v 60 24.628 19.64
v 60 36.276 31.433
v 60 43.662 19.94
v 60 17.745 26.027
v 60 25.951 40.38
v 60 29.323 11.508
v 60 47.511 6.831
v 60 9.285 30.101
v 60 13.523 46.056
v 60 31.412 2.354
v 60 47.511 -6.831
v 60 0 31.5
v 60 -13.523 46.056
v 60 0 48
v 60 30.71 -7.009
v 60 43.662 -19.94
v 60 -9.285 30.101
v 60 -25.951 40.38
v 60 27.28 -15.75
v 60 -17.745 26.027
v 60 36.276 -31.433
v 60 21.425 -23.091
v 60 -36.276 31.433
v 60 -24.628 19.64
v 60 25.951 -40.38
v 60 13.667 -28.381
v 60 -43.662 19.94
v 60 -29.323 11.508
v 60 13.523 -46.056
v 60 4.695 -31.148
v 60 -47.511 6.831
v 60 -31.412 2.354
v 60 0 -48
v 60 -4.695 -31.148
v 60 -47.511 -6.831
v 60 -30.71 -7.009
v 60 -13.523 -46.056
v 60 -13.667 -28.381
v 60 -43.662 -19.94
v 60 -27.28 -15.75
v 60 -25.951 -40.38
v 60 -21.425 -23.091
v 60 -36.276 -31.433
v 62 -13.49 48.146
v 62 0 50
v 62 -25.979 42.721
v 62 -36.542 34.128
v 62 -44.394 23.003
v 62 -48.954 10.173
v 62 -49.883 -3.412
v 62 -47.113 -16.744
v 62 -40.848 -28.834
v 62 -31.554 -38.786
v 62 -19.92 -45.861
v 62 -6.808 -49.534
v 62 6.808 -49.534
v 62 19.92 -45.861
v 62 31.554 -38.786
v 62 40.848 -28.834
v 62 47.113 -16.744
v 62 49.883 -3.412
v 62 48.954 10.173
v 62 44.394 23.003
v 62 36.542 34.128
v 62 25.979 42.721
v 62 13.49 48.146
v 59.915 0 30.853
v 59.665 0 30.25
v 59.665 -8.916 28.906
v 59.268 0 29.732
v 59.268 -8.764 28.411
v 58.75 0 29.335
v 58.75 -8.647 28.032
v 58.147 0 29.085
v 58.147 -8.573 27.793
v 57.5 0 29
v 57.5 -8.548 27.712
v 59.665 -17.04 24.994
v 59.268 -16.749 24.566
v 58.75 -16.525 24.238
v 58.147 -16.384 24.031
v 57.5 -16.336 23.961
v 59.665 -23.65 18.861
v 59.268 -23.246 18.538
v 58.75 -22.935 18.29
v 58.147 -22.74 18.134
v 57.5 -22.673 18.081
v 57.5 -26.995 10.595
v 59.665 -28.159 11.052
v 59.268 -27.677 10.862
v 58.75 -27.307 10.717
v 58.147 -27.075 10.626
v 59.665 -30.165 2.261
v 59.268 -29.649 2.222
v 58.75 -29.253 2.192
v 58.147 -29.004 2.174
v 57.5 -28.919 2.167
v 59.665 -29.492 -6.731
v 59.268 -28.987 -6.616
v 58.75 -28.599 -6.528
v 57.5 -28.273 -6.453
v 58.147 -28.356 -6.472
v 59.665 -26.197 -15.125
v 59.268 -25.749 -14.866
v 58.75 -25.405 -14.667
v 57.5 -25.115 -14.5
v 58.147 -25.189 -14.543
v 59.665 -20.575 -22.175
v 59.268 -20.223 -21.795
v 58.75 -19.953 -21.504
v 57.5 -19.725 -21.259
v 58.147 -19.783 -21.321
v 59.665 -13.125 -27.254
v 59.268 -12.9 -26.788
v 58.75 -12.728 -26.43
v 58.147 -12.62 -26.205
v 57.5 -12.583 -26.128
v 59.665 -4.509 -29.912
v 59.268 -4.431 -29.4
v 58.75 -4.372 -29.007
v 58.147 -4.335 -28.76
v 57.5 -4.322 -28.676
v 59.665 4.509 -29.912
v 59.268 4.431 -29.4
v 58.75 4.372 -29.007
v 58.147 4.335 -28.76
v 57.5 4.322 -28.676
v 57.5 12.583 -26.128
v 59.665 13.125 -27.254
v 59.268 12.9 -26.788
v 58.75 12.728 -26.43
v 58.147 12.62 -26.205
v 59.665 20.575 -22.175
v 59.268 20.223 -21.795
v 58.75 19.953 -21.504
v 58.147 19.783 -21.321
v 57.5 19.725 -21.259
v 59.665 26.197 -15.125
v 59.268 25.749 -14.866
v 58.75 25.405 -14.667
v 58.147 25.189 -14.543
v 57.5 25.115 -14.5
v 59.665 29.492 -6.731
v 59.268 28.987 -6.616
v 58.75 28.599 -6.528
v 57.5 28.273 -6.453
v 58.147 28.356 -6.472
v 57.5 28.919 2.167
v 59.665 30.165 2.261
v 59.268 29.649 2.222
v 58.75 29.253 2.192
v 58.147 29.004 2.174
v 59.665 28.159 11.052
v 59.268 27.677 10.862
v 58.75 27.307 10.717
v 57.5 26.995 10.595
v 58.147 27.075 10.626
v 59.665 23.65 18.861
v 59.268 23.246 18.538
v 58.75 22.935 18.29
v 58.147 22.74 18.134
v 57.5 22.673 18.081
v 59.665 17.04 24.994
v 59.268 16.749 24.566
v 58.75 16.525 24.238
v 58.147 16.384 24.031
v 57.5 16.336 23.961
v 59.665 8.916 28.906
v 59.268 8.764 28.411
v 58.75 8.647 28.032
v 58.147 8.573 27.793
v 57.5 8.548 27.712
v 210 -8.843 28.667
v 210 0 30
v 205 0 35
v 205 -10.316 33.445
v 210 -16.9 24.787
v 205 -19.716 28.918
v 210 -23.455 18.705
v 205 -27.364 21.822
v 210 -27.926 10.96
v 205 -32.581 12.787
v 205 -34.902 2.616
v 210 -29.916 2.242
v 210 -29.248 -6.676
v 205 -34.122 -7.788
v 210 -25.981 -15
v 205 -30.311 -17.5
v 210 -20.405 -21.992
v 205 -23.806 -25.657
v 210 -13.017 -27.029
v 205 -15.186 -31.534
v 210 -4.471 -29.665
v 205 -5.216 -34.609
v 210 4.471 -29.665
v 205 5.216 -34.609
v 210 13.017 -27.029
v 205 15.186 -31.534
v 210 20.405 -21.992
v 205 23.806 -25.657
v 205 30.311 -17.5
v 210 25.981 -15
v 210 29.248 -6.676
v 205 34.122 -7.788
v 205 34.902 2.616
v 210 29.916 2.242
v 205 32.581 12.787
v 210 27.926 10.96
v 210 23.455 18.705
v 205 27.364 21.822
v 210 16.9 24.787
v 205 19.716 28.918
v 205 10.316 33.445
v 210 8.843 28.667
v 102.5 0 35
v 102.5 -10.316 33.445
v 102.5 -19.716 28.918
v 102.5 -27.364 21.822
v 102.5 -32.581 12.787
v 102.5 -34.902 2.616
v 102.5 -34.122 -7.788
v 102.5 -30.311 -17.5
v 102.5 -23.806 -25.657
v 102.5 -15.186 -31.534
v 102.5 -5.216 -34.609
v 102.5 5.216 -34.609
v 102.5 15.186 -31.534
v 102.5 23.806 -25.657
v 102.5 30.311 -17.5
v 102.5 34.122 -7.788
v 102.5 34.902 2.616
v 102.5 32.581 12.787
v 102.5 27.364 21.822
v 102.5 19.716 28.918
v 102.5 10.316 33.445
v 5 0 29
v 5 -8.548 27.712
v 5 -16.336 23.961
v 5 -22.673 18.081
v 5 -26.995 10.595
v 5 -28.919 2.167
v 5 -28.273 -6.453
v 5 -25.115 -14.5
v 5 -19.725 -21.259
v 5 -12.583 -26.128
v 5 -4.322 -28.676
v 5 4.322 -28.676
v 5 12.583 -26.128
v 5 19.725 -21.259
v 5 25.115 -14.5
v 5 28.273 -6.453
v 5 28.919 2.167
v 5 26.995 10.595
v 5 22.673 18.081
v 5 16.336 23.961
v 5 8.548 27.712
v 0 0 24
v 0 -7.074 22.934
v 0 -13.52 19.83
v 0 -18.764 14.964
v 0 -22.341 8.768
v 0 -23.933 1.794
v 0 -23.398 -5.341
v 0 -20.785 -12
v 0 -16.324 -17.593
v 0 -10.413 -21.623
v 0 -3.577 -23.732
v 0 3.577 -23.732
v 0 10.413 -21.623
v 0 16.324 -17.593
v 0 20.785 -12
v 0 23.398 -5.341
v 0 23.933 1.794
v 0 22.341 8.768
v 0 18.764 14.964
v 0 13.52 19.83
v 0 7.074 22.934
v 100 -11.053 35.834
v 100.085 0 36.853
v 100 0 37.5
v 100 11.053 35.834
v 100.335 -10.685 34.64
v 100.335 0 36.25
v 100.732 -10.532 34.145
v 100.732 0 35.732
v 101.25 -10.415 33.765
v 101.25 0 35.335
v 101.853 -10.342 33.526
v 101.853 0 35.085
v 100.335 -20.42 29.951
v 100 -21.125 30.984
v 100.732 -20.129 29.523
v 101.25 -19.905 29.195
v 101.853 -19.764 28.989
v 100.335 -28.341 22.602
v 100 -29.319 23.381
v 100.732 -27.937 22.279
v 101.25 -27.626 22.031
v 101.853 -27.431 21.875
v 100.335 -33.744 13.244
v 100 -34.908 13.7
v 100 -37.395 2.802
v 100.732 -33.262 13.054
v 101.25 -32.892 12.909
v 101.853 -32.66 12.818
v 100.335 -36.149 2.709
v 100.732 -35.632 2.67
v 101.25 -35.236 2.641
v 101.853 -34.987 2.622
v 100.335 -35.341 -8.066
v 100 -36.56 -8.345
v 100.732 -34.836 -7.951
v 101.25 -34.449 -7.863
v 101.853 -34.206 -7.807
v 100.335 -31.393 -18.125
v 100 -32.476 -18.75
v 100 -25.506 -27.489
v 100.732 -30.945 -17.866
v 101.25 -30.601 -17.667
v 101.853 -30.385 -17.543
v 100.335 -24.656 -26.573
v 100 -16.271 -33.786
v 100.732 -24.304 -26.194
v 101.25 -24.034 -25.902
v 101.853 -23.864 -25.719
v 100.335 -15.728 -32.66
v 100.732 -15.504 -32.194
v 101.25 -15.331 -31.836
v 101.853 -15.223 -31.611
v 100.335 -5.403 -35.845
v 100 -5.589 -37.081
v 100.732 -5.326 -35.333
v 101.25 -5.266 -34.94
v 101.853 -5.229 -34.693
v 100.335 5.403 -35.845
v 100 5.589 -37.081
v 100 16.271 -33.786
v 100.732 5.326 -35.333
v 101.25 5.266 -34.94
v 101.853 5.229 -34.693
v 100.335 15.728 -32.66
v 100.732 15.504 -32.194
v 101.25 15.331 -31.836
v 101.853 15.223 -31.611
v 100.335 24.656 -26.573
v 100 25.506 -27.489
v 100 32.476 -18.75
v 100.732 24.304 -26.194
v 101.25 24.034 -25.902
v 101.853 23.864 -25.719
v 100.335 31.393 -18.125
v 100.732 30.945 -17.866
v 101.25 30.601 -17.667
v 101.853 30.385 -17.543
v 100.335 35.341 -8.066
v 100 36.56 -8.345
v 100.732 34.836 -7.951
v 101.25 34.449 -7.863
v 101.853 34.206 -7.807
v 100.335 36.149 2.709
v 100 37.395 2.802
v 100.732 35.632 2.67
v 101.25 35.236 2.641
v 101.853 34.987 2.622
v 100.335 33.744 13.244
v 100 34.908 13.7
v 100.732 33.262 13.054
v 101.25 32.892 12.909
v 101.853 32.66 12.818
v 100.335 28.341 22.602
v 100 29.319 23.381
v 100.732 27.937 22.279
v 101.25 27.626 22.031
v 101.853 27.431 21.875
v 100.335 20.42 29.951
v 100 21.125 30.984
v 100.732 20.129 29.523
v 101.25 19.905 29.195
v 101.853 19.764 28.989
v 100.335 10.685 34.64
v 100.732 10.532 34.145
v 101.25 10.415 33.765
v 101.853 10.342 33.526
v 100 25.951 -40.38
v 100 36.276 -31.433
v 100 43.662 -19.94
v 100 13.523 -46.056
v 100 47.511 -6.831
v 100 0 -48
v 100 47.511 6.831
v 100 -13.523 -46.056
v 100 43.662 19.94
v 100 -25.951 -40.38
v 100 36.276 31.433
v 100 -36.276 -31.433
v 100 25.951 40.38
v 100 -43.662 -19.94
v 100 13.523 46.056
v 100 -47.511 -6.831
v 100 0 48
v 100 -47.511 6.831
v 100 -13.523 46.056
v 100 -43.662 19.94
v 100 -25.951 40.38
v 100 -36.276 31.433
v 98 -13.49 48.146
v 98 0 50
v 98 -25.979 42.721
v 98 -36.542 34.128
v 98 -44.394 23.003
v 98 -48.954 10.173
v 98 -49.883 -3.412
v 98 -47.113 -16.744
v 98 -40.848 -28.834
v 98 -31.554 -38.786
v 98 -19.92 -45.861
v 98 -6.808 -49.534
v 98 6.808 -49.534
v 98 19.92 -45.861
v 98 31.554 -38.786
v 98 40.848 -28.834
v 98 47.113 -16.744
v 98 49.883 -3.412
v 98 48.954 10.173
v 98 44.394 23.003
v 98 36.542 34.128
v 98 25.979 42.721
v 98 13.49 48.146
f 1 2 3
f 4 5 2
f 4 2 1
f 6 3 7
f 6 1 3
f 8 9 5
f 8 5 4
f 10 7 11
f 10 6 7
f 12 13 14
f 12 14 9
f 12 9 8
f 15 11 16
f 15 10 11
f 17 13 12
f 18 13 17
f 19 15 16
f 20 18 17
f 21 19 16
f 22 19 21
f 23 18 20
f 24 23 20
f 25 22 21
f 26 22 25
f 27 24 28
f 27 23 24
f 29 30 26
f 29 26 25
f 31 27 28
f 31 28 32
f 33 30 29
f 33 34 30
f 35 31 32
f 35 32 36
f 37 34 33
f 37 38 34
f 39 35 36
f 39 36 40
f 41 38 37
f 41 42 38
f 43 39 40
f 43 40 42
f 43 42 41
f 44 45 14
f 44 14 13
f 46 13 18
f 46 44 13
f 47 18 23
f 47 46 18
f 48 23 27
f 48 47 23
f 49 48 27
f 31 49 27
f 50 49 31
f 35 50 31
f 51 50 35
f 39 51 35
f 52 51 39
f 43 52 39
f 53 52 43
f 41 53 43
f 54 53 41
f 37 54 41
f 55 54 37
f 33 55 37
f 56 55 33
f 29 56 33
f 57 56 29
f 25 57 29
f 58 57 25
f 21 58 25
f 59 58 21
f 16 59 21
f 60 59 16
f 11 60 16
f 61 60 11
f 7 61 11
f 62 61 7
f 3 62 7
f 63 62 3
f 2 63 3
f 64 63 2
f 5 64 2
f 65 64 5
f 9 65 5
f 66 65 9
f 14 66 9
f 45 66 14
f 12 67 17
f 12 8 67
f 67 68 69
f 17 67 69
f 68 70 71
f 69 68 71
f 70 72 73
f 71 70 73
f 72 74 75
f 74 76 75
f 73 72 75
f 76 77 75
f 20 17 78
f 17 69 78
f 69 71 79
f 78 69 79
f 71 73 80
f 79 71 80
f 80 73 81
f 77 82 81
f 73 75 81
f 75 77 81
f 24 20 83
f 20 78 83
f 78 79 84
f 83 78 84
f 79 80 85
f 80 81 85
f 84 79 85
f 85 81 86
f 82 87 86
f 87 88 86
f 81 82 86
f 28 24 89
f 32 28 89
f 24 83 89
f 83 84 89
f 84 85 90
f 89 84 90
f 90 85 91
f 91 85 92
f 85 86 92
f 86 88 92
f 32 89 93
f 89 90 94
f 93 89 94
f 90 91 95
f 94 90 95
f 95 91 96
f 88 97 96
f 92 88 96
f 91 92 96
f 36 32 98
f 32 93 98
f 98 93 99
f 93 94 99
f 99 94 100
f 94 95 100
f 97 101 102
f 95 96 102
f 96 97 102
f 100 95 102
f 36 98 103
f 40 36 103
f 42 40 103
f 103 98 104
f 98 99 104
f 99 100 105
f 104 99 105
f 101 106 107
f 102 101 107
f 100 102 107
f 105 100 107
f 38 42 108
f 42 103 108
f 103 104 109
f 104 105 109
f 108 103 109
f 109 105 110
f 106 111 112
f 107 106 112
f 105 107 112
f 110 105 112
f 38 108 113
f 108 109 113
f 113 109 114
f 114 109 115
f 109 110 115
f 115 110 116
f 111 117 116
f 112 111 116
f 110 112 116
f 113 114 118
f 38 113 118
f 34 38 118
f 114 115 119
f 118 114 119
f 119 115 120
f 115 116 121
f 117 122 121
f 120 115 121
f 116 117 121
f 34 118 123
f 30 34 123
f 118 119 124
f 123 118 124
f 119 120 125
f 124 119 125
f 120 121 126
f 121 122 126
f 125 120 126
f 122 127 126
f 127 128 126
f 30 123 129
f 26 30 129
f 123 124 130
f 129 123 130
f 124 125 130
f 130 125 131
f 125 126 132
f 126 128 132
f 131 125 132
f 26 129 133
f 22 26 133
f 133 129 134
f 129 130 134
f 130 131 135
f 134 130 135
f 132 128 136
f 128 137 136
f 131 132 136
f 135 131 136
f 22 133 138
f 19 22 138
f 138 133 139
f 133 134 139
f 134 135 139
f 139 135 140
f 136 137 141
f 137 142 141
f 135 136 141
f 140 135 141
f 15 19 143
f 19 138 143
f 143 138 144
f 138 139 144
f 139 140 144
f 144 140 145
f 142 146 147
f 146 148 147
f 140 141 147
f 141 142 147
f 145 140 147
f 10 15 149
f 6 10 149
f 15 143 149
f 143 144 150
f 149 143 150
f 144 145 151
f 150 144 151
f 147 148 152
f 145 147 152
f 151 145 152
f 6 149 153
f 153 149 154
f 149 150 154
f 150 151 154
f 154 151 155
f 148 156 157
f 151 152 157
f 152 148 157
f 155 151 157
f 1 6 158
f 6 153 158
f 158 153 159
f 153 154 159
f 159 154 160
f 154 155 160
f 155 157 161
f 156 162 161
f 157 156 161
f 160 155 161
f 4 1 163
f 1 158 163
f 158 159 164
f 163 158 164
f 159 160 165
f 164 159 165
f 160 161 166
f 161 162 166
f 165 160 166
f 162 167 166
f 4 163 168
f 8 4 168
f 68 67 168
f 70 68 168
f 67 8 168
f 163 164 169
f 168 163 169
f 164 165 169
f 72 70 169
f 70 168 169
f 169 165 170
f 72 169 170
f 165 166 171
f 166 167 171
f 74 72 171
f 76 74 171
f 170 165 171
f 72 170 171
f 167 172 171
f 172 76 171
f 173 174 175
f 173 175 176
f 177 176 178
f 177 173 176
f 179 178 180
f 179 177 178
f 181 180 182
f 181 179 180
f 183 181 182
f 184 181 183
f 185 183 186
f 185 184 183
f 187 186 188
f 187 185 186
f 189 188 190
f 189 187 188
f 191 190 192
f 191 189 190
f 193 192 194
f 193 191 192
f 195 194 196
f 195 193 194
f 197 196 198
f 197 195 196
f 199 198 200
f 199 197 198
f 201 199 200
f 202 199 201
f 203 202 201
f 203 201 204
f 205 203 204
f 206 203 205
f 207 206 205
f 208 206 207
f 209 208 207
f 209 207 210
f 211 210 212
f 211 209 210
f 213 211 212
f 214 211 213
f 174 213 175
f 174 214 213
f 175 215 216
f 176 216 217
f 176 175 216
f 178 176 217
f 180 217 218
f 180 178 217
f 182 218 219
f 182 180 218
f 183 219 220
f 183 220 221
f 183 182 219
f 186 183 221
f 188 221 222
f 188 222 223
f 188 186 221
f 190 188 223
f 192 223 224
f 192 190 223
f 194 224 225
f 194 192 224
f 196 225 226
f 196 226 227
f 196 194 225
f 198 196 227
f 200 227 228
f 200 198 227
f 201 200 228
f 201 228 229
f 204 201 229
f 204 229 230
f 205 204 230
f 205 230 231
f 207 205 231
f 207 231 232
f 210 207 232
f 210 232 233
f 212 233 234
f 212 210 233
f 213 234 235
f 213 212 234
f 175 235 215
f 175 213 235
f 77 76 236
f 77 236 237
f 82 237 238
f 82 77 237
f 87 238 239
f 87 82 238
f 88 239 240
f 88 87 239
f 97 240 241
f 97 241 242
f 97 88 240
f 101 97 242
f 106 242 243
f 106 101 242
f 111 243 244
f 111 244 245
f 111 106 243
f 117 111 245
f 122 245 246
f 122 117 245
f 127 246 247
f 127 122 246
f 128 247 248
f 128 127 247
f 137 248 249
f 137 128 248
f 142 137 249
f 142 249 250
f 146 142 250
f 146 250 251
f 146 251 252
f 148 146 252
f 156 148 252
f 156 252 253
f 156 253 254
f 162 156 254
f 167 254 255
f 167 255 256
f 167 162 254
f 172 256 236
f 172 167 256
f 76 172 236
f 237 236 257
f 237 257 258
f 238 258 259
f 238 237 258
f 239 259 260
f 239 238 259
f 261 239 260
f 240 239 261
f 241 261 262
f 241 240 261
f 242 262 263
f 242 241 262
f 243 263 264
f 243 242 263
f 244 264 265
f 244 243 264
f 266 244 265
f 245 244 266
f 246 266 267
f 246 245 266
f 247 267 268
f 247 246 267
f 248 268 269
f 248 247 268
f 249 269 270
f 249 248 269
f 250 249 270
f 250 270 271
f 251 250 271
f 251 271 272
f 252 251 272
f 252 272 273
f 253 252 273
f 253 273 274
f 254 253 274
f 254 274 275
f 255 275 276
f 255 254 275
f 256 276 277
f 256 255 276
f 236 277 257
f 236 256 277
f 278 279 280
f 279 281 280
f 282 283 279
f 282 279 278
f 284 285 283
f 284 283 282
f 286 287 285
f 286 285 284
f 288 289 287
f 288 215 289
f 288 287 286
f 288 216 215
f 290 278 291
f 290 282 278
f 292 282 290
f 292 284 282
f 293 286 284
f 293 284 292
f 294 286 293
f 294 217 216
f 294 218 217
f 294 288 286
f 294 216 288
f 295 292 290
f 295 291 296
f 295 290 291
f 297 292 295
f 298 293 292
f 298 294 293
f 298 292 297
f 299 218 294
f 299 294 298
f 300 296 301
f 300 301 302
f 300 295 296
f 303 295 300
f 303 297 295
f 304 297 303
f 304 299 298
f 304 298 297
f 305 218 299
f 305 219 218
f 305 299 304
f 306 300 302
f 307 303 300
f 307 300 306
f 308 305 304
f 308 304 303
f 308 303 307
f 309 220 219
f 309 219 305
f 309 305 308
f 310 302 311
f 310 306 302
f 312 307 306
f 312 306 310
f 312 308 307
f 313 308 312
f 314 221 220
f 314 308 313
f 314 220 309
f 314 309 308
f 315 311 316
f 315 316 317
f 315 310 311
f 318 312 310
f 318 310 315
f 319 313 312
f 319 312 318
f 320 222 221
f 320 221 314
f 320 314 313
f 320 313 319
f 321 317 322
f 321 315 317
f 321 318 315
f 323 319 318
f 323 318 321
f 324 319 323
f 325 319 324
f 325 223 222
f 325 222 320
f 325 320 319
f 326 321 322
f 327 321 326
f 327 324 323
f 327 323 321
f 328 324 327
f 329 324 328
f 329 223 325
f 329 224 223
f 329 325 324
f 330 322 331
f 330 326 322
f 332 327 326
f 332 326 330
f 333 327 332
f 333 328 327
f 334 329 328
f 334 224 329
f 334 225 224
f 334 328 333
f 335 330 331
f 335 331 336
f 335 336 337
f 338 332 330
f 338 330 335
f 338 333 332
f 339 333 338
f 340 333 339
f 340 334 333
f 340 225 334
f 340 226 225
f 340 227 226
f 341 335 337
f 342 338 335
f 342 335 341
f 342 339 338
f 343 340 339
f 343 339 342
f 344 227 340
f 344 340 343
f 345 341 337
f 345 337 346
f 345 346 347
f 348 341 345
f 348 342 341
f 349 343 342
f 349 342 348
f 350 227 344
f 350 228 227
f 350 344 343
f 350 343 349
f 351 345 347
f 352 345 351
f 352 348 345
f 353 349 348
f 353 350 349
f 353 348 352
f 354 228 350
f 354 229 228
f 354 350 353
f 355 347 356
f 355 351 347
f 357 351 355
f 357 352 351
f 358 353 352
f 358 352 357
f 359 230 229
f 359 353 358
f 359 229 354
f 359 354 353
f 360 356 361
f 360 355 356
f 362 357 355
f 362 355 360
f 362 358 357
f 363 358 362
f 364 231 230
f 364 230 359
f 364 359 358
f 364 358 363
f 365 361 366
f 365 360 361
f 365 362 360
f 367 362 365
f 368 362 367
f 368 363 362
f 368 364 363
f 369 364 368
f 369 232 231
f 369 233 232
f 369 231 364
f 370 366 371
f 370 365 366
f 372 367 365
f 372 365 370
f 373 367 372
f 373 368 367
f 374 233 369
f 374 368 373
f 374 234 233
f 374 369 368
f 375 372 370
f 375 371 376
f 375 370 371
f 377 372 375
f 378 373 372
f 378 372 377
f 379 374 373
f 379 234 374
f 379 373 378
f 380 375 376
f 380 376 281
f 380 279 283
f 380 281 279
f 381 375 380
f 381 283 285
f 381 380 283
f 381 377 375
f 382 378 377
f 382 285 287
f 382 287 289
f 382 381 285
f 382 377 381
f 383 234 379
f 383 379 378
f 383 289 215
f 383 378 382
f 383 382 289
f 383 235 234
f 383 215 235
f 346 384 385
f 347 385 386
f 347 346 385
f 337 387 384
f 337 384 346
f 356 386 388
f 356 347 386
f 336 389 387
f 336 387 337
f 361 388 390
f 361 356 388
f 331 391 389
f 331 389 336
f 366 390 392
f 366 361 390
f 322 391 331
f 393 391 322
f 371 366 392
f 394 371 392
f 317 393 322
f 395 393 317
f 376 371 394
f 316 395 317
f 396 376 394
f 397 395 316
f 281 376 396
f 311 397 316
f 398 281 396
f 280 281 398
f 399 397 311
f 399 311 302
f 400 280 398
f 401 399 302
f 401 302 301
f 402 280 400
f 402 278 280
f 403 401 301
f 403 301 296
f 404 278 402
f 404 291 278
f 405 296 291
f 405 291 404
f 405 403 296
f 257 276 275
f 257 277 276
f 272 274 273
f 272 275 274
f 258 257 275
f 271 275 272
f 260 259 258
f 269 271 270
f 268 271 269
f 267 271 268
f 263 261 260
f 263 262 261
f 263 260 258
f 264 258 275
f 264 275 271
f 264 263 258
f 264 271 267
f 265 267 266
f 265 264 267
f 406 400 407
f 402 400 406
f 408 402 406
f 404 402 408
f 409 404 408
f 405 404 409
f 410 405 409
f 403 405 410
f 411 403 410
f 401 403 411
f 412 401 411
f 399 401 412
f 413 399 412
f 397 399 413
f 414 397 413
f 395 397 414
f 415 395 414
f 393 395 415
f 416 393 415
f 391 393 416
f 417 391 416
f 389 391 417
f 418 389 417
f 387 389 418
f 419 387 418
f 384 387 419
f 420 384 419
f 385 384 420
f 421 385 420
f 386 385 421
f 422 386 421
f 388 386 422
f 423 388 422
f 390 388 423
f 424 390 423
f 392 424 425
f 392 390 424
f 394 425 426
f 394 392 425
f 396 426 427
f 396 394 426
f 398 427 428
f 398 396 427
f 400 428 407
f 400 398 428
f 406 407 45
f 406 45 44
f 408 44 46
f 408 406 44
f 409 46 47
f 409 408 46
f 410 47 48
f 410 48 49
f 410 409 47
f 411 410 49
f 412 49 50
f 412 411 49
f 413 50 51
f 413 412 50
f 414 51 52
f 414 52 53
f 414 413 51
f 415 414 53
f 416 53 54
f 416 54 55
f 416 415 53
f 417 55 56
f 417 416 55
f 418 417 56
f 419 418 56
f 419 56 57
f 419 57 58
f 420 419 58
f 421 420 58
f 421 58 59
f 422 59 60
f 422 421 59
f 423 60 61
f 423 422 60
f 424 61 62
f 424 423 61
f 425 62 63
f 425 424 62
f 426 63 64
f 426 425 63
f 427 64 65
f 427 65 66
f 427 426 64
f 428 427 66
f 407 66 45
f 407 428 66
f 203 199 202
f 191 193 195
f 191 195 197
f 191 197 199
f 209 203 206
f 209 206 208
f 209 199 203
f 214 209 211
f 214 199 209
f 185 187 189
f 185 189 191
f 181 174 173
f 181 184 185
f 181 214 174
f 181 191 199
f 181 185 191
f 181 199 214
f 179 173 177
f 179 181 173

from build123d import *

# Parameters (mm, degrees)
CHAMFER1_SIZE = 5
CHAMFER2_SIZE = 2
FILLET1_R     = 2.5


with BuildPart() as part:
    # Sketch1 → Revolve1 (revolve)
    with BuildSketch(Plane.XY, mode=Mode.PRIVATE) as revolve1_sk:
        Polygon((0, 0), (0, 29), (60, 29), (60, 50), (100, 50), (100, 35), (210, 35), (210, 0), align=None)
    revolve(revolve1_sk.sketch.rotate(Axis((0, 0, 0), (1, 0, 0)), 90), axis=Axis((0, 0, 0), (1, 0, 0)))

    # Chamfer1
    chamfer1_edges = [part.edges().sort_by_distance(p)[0] for p in [
        (210, 0, -35),
        (0, 0, -29),
    ]]
    chamfer(chamfer1_edges, length=CHAMFER1_SIZE)

    # Chamfer2
    chamfer2_edges = [part.edges().sort_by_distance(p)[0] for p in [
        (100, 0, -50),
        (60, 0, -50),
    ]]
    chamfer(chamfer2_edges, length=CHAMFER2_SIZE)

    # Fillet1
    fillet1_edges = [part.edges().sort_by_distance(p)[0] for p in [
        (100, 0, -35),
        (60, 0, -29),
    ]]
    fillet(fillet1_edges, radius=FILLET1_R)


solid = part.part
